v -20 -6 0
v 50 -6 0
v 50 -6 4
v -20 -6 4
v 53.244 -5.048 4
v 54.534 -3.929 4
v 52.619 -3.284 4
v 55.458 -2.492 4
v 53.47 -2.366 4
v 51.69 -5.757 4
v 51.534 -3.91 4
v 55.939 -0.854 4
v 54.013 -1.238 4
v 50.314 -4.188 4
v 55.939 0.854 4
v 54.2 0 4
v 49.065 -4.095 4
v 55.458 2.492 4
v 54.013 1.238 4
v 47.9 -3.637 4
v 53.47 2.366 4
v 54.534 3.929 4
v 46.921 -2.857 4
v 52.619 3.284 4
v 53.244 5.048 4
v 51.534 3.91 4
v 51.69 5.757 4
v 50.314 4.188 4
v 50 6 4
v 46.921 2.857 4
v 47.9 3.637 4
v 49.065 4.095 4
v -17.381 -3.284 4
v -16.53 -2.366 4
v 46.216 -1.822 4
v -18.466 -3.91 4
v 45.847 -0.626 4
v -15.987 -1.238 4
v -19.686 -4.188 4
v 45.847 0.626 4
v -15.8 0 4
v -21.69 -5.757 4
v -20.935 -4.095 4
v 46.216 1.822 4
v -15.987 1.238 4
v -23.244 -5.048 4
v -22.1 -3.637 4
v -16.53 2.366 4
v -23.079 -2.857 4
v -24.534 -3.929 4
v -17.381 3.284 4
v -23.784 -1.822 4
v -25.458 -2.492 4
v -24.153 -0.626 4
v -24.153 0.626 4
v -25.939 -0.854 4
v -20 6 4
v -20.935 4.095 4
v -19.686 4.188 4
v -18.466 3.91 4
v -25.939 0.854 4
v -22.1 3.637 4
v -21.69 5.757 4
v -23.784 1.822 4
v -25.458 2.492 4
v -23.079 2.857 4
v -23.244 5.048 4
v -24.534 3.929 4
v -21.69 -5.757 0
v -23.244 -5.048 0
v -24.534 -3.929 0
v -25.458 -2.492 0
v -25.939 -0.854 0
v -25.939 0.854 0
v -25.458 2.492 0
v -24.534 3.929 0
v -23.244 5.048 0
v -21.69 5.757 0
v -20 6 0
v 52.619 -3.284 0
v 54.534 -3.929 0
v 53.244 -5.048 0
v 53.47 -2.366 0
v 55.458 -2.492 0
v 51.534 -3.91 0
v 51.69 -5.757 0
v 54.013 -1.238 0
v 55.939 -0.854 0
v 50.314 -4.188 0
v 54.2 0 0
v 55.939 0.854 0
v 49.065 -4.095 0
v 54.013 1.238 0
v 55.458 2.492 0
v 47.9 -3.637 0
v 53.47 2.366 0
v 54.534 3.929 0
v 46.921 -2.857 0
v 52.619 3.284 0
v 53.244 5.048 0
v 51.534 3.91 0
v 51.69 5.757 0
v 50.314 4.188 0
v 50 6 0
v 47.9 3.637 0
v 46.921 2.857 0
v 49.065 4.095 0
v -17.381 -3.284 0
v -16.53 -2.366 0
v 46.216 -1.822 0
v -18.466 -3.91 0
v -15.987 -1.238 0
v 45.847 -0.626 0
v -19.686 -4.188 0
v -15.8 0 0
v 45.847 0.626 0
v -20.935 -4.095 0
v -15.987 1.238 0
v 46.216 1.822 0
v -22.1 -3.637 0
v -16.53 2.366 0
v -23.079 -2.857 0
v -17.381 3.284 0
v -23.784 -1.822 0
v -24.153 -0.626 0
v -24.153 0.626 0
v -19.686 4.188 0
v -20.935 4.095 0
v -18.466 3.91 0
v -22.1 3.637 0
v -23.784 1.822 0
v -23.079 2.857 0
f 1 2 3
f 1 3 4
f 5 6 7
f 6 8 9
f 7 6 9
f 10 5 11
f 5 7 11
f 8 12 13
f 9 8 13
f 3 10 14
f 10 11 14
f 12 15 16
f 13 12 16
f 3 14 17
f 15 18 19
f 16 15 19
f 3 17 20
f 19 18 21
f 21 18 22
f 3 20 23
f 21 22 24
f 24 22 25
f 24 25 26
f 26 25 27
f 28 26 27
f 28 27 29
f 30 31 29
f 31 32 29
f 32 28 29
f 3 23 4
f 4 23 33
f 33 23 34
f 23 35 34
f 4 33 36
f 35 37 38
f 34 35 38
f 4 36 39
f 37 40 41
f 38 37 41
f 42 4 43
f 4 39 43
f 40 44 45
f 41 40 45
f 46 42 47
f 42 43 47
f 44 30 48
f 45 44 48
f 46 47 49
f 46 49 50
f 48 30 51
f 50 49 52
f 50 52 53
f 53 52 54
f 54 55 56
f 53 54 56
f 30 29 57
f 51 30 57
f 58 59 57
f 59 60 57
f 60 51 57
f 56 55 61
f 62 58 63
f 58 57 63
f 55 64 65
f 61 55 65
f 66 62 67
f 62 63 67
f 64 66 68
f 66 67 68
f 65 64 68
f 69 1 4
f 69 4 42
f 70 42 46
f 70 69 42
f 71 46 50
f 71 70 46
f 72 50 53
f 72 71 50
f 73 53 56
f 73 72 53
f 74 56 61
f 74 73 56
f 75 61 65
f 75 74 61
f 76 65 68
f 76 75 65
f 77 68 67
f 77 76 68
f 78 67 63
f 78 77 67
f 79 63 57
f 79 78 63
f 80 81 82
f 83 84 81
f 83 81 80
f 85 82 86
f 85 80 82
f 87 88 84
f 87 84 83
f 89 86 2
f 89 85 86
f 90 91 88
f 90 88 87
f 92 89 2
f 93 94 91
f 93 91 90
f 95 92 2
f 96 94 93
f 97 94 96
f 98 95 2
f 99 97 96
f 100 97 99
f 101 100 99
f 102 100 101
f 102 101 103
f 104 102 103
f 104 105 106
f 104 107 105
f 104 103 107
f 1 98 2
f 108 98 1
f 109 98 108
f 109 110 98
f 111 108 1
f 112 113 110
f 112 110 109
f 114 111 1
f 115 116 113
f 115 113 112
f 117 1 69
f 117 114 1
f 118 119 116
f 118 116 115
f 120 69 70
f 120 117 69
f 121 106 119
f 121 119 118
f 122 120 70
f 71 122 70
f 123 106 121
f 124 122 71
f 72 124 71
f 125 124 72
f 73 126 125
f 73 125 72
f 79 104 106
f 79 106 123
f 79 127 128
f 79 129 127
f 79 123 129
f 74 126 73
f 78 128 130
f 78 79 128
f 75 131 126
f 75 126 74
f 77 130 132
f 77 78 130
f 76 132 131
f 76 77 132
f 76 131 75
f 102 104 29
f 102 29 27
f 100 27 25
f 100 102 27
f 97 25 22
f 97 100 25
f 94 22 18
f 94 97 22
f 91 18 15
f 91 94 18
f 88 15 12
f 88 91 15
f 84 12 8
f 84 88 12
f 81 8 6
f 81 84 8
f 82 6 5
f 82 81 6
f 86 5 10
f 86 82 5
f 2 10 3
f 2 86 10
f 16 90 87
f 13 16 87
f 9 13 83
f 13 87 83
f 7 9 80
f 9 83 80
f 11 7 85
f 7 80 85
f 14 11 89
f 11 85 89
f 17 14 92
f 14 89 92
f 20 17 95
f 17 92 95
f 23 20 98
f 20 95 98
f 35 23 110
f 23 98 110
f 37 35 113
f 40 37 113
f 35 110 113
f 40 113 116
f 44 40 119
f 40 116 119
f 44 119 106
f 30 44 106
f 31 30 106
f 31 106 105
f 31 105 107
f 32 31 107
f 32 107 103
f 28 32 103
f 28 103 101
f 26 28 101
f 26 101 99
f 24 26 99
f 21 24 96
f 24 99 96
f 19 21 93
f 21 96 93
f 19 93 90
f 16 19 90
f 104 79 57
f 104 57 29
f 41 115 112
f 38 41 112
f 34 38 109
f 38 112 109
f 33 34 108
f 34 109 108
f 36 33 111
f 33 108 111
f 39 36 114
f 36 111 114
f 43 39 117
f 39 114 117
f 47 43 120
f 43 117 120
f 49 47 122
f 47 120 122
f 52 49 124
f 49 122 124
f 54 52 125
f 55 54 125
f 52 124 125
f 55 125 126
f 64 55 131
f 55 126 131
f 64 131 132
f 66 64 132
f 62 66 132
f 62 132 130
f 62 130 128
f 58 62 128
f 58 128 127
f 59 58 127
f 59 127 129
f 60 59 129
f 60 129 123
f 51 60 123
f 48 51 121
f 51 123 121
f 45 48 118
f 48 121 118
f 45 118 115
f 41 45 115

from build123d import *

# Parameters (mm, degrees)
SKETCH_1_R      = 4.2
EXTRUDE_1_DEPTH = 4


with BuildPart() as part:
    # 草图1 → 凸台-拉伸1 (new body)
    with BuildSketch(Plane(origin=(0, 0, 0), x_dir=(-1, 0, 0), z_dir=(0, 0, -1))):
        with BuildLine():
            Line((20, 6), (-50, 6))
            ThreePointArc((-50, 6), (-56, 0), (-50, -6))
            Line((-50, -6), (20, -6))
            ThreePointArc((20, -6), (26, 0), (20, 6))
        make_face()
        with Locations(Location((20, 0, 0), (0, 0, 180))):
            Circle(SKETCH_1_R, mode=Mode.SUBTRACT)
        with Locations(Location((-50, 0, 0), (0, 0, 180))):
            Circle(SKETCH_1_R, mode=Mode.SUBTRACT)
    extrude(amount=-EXTRUDE_1_DEPTH)


solid = part.part
